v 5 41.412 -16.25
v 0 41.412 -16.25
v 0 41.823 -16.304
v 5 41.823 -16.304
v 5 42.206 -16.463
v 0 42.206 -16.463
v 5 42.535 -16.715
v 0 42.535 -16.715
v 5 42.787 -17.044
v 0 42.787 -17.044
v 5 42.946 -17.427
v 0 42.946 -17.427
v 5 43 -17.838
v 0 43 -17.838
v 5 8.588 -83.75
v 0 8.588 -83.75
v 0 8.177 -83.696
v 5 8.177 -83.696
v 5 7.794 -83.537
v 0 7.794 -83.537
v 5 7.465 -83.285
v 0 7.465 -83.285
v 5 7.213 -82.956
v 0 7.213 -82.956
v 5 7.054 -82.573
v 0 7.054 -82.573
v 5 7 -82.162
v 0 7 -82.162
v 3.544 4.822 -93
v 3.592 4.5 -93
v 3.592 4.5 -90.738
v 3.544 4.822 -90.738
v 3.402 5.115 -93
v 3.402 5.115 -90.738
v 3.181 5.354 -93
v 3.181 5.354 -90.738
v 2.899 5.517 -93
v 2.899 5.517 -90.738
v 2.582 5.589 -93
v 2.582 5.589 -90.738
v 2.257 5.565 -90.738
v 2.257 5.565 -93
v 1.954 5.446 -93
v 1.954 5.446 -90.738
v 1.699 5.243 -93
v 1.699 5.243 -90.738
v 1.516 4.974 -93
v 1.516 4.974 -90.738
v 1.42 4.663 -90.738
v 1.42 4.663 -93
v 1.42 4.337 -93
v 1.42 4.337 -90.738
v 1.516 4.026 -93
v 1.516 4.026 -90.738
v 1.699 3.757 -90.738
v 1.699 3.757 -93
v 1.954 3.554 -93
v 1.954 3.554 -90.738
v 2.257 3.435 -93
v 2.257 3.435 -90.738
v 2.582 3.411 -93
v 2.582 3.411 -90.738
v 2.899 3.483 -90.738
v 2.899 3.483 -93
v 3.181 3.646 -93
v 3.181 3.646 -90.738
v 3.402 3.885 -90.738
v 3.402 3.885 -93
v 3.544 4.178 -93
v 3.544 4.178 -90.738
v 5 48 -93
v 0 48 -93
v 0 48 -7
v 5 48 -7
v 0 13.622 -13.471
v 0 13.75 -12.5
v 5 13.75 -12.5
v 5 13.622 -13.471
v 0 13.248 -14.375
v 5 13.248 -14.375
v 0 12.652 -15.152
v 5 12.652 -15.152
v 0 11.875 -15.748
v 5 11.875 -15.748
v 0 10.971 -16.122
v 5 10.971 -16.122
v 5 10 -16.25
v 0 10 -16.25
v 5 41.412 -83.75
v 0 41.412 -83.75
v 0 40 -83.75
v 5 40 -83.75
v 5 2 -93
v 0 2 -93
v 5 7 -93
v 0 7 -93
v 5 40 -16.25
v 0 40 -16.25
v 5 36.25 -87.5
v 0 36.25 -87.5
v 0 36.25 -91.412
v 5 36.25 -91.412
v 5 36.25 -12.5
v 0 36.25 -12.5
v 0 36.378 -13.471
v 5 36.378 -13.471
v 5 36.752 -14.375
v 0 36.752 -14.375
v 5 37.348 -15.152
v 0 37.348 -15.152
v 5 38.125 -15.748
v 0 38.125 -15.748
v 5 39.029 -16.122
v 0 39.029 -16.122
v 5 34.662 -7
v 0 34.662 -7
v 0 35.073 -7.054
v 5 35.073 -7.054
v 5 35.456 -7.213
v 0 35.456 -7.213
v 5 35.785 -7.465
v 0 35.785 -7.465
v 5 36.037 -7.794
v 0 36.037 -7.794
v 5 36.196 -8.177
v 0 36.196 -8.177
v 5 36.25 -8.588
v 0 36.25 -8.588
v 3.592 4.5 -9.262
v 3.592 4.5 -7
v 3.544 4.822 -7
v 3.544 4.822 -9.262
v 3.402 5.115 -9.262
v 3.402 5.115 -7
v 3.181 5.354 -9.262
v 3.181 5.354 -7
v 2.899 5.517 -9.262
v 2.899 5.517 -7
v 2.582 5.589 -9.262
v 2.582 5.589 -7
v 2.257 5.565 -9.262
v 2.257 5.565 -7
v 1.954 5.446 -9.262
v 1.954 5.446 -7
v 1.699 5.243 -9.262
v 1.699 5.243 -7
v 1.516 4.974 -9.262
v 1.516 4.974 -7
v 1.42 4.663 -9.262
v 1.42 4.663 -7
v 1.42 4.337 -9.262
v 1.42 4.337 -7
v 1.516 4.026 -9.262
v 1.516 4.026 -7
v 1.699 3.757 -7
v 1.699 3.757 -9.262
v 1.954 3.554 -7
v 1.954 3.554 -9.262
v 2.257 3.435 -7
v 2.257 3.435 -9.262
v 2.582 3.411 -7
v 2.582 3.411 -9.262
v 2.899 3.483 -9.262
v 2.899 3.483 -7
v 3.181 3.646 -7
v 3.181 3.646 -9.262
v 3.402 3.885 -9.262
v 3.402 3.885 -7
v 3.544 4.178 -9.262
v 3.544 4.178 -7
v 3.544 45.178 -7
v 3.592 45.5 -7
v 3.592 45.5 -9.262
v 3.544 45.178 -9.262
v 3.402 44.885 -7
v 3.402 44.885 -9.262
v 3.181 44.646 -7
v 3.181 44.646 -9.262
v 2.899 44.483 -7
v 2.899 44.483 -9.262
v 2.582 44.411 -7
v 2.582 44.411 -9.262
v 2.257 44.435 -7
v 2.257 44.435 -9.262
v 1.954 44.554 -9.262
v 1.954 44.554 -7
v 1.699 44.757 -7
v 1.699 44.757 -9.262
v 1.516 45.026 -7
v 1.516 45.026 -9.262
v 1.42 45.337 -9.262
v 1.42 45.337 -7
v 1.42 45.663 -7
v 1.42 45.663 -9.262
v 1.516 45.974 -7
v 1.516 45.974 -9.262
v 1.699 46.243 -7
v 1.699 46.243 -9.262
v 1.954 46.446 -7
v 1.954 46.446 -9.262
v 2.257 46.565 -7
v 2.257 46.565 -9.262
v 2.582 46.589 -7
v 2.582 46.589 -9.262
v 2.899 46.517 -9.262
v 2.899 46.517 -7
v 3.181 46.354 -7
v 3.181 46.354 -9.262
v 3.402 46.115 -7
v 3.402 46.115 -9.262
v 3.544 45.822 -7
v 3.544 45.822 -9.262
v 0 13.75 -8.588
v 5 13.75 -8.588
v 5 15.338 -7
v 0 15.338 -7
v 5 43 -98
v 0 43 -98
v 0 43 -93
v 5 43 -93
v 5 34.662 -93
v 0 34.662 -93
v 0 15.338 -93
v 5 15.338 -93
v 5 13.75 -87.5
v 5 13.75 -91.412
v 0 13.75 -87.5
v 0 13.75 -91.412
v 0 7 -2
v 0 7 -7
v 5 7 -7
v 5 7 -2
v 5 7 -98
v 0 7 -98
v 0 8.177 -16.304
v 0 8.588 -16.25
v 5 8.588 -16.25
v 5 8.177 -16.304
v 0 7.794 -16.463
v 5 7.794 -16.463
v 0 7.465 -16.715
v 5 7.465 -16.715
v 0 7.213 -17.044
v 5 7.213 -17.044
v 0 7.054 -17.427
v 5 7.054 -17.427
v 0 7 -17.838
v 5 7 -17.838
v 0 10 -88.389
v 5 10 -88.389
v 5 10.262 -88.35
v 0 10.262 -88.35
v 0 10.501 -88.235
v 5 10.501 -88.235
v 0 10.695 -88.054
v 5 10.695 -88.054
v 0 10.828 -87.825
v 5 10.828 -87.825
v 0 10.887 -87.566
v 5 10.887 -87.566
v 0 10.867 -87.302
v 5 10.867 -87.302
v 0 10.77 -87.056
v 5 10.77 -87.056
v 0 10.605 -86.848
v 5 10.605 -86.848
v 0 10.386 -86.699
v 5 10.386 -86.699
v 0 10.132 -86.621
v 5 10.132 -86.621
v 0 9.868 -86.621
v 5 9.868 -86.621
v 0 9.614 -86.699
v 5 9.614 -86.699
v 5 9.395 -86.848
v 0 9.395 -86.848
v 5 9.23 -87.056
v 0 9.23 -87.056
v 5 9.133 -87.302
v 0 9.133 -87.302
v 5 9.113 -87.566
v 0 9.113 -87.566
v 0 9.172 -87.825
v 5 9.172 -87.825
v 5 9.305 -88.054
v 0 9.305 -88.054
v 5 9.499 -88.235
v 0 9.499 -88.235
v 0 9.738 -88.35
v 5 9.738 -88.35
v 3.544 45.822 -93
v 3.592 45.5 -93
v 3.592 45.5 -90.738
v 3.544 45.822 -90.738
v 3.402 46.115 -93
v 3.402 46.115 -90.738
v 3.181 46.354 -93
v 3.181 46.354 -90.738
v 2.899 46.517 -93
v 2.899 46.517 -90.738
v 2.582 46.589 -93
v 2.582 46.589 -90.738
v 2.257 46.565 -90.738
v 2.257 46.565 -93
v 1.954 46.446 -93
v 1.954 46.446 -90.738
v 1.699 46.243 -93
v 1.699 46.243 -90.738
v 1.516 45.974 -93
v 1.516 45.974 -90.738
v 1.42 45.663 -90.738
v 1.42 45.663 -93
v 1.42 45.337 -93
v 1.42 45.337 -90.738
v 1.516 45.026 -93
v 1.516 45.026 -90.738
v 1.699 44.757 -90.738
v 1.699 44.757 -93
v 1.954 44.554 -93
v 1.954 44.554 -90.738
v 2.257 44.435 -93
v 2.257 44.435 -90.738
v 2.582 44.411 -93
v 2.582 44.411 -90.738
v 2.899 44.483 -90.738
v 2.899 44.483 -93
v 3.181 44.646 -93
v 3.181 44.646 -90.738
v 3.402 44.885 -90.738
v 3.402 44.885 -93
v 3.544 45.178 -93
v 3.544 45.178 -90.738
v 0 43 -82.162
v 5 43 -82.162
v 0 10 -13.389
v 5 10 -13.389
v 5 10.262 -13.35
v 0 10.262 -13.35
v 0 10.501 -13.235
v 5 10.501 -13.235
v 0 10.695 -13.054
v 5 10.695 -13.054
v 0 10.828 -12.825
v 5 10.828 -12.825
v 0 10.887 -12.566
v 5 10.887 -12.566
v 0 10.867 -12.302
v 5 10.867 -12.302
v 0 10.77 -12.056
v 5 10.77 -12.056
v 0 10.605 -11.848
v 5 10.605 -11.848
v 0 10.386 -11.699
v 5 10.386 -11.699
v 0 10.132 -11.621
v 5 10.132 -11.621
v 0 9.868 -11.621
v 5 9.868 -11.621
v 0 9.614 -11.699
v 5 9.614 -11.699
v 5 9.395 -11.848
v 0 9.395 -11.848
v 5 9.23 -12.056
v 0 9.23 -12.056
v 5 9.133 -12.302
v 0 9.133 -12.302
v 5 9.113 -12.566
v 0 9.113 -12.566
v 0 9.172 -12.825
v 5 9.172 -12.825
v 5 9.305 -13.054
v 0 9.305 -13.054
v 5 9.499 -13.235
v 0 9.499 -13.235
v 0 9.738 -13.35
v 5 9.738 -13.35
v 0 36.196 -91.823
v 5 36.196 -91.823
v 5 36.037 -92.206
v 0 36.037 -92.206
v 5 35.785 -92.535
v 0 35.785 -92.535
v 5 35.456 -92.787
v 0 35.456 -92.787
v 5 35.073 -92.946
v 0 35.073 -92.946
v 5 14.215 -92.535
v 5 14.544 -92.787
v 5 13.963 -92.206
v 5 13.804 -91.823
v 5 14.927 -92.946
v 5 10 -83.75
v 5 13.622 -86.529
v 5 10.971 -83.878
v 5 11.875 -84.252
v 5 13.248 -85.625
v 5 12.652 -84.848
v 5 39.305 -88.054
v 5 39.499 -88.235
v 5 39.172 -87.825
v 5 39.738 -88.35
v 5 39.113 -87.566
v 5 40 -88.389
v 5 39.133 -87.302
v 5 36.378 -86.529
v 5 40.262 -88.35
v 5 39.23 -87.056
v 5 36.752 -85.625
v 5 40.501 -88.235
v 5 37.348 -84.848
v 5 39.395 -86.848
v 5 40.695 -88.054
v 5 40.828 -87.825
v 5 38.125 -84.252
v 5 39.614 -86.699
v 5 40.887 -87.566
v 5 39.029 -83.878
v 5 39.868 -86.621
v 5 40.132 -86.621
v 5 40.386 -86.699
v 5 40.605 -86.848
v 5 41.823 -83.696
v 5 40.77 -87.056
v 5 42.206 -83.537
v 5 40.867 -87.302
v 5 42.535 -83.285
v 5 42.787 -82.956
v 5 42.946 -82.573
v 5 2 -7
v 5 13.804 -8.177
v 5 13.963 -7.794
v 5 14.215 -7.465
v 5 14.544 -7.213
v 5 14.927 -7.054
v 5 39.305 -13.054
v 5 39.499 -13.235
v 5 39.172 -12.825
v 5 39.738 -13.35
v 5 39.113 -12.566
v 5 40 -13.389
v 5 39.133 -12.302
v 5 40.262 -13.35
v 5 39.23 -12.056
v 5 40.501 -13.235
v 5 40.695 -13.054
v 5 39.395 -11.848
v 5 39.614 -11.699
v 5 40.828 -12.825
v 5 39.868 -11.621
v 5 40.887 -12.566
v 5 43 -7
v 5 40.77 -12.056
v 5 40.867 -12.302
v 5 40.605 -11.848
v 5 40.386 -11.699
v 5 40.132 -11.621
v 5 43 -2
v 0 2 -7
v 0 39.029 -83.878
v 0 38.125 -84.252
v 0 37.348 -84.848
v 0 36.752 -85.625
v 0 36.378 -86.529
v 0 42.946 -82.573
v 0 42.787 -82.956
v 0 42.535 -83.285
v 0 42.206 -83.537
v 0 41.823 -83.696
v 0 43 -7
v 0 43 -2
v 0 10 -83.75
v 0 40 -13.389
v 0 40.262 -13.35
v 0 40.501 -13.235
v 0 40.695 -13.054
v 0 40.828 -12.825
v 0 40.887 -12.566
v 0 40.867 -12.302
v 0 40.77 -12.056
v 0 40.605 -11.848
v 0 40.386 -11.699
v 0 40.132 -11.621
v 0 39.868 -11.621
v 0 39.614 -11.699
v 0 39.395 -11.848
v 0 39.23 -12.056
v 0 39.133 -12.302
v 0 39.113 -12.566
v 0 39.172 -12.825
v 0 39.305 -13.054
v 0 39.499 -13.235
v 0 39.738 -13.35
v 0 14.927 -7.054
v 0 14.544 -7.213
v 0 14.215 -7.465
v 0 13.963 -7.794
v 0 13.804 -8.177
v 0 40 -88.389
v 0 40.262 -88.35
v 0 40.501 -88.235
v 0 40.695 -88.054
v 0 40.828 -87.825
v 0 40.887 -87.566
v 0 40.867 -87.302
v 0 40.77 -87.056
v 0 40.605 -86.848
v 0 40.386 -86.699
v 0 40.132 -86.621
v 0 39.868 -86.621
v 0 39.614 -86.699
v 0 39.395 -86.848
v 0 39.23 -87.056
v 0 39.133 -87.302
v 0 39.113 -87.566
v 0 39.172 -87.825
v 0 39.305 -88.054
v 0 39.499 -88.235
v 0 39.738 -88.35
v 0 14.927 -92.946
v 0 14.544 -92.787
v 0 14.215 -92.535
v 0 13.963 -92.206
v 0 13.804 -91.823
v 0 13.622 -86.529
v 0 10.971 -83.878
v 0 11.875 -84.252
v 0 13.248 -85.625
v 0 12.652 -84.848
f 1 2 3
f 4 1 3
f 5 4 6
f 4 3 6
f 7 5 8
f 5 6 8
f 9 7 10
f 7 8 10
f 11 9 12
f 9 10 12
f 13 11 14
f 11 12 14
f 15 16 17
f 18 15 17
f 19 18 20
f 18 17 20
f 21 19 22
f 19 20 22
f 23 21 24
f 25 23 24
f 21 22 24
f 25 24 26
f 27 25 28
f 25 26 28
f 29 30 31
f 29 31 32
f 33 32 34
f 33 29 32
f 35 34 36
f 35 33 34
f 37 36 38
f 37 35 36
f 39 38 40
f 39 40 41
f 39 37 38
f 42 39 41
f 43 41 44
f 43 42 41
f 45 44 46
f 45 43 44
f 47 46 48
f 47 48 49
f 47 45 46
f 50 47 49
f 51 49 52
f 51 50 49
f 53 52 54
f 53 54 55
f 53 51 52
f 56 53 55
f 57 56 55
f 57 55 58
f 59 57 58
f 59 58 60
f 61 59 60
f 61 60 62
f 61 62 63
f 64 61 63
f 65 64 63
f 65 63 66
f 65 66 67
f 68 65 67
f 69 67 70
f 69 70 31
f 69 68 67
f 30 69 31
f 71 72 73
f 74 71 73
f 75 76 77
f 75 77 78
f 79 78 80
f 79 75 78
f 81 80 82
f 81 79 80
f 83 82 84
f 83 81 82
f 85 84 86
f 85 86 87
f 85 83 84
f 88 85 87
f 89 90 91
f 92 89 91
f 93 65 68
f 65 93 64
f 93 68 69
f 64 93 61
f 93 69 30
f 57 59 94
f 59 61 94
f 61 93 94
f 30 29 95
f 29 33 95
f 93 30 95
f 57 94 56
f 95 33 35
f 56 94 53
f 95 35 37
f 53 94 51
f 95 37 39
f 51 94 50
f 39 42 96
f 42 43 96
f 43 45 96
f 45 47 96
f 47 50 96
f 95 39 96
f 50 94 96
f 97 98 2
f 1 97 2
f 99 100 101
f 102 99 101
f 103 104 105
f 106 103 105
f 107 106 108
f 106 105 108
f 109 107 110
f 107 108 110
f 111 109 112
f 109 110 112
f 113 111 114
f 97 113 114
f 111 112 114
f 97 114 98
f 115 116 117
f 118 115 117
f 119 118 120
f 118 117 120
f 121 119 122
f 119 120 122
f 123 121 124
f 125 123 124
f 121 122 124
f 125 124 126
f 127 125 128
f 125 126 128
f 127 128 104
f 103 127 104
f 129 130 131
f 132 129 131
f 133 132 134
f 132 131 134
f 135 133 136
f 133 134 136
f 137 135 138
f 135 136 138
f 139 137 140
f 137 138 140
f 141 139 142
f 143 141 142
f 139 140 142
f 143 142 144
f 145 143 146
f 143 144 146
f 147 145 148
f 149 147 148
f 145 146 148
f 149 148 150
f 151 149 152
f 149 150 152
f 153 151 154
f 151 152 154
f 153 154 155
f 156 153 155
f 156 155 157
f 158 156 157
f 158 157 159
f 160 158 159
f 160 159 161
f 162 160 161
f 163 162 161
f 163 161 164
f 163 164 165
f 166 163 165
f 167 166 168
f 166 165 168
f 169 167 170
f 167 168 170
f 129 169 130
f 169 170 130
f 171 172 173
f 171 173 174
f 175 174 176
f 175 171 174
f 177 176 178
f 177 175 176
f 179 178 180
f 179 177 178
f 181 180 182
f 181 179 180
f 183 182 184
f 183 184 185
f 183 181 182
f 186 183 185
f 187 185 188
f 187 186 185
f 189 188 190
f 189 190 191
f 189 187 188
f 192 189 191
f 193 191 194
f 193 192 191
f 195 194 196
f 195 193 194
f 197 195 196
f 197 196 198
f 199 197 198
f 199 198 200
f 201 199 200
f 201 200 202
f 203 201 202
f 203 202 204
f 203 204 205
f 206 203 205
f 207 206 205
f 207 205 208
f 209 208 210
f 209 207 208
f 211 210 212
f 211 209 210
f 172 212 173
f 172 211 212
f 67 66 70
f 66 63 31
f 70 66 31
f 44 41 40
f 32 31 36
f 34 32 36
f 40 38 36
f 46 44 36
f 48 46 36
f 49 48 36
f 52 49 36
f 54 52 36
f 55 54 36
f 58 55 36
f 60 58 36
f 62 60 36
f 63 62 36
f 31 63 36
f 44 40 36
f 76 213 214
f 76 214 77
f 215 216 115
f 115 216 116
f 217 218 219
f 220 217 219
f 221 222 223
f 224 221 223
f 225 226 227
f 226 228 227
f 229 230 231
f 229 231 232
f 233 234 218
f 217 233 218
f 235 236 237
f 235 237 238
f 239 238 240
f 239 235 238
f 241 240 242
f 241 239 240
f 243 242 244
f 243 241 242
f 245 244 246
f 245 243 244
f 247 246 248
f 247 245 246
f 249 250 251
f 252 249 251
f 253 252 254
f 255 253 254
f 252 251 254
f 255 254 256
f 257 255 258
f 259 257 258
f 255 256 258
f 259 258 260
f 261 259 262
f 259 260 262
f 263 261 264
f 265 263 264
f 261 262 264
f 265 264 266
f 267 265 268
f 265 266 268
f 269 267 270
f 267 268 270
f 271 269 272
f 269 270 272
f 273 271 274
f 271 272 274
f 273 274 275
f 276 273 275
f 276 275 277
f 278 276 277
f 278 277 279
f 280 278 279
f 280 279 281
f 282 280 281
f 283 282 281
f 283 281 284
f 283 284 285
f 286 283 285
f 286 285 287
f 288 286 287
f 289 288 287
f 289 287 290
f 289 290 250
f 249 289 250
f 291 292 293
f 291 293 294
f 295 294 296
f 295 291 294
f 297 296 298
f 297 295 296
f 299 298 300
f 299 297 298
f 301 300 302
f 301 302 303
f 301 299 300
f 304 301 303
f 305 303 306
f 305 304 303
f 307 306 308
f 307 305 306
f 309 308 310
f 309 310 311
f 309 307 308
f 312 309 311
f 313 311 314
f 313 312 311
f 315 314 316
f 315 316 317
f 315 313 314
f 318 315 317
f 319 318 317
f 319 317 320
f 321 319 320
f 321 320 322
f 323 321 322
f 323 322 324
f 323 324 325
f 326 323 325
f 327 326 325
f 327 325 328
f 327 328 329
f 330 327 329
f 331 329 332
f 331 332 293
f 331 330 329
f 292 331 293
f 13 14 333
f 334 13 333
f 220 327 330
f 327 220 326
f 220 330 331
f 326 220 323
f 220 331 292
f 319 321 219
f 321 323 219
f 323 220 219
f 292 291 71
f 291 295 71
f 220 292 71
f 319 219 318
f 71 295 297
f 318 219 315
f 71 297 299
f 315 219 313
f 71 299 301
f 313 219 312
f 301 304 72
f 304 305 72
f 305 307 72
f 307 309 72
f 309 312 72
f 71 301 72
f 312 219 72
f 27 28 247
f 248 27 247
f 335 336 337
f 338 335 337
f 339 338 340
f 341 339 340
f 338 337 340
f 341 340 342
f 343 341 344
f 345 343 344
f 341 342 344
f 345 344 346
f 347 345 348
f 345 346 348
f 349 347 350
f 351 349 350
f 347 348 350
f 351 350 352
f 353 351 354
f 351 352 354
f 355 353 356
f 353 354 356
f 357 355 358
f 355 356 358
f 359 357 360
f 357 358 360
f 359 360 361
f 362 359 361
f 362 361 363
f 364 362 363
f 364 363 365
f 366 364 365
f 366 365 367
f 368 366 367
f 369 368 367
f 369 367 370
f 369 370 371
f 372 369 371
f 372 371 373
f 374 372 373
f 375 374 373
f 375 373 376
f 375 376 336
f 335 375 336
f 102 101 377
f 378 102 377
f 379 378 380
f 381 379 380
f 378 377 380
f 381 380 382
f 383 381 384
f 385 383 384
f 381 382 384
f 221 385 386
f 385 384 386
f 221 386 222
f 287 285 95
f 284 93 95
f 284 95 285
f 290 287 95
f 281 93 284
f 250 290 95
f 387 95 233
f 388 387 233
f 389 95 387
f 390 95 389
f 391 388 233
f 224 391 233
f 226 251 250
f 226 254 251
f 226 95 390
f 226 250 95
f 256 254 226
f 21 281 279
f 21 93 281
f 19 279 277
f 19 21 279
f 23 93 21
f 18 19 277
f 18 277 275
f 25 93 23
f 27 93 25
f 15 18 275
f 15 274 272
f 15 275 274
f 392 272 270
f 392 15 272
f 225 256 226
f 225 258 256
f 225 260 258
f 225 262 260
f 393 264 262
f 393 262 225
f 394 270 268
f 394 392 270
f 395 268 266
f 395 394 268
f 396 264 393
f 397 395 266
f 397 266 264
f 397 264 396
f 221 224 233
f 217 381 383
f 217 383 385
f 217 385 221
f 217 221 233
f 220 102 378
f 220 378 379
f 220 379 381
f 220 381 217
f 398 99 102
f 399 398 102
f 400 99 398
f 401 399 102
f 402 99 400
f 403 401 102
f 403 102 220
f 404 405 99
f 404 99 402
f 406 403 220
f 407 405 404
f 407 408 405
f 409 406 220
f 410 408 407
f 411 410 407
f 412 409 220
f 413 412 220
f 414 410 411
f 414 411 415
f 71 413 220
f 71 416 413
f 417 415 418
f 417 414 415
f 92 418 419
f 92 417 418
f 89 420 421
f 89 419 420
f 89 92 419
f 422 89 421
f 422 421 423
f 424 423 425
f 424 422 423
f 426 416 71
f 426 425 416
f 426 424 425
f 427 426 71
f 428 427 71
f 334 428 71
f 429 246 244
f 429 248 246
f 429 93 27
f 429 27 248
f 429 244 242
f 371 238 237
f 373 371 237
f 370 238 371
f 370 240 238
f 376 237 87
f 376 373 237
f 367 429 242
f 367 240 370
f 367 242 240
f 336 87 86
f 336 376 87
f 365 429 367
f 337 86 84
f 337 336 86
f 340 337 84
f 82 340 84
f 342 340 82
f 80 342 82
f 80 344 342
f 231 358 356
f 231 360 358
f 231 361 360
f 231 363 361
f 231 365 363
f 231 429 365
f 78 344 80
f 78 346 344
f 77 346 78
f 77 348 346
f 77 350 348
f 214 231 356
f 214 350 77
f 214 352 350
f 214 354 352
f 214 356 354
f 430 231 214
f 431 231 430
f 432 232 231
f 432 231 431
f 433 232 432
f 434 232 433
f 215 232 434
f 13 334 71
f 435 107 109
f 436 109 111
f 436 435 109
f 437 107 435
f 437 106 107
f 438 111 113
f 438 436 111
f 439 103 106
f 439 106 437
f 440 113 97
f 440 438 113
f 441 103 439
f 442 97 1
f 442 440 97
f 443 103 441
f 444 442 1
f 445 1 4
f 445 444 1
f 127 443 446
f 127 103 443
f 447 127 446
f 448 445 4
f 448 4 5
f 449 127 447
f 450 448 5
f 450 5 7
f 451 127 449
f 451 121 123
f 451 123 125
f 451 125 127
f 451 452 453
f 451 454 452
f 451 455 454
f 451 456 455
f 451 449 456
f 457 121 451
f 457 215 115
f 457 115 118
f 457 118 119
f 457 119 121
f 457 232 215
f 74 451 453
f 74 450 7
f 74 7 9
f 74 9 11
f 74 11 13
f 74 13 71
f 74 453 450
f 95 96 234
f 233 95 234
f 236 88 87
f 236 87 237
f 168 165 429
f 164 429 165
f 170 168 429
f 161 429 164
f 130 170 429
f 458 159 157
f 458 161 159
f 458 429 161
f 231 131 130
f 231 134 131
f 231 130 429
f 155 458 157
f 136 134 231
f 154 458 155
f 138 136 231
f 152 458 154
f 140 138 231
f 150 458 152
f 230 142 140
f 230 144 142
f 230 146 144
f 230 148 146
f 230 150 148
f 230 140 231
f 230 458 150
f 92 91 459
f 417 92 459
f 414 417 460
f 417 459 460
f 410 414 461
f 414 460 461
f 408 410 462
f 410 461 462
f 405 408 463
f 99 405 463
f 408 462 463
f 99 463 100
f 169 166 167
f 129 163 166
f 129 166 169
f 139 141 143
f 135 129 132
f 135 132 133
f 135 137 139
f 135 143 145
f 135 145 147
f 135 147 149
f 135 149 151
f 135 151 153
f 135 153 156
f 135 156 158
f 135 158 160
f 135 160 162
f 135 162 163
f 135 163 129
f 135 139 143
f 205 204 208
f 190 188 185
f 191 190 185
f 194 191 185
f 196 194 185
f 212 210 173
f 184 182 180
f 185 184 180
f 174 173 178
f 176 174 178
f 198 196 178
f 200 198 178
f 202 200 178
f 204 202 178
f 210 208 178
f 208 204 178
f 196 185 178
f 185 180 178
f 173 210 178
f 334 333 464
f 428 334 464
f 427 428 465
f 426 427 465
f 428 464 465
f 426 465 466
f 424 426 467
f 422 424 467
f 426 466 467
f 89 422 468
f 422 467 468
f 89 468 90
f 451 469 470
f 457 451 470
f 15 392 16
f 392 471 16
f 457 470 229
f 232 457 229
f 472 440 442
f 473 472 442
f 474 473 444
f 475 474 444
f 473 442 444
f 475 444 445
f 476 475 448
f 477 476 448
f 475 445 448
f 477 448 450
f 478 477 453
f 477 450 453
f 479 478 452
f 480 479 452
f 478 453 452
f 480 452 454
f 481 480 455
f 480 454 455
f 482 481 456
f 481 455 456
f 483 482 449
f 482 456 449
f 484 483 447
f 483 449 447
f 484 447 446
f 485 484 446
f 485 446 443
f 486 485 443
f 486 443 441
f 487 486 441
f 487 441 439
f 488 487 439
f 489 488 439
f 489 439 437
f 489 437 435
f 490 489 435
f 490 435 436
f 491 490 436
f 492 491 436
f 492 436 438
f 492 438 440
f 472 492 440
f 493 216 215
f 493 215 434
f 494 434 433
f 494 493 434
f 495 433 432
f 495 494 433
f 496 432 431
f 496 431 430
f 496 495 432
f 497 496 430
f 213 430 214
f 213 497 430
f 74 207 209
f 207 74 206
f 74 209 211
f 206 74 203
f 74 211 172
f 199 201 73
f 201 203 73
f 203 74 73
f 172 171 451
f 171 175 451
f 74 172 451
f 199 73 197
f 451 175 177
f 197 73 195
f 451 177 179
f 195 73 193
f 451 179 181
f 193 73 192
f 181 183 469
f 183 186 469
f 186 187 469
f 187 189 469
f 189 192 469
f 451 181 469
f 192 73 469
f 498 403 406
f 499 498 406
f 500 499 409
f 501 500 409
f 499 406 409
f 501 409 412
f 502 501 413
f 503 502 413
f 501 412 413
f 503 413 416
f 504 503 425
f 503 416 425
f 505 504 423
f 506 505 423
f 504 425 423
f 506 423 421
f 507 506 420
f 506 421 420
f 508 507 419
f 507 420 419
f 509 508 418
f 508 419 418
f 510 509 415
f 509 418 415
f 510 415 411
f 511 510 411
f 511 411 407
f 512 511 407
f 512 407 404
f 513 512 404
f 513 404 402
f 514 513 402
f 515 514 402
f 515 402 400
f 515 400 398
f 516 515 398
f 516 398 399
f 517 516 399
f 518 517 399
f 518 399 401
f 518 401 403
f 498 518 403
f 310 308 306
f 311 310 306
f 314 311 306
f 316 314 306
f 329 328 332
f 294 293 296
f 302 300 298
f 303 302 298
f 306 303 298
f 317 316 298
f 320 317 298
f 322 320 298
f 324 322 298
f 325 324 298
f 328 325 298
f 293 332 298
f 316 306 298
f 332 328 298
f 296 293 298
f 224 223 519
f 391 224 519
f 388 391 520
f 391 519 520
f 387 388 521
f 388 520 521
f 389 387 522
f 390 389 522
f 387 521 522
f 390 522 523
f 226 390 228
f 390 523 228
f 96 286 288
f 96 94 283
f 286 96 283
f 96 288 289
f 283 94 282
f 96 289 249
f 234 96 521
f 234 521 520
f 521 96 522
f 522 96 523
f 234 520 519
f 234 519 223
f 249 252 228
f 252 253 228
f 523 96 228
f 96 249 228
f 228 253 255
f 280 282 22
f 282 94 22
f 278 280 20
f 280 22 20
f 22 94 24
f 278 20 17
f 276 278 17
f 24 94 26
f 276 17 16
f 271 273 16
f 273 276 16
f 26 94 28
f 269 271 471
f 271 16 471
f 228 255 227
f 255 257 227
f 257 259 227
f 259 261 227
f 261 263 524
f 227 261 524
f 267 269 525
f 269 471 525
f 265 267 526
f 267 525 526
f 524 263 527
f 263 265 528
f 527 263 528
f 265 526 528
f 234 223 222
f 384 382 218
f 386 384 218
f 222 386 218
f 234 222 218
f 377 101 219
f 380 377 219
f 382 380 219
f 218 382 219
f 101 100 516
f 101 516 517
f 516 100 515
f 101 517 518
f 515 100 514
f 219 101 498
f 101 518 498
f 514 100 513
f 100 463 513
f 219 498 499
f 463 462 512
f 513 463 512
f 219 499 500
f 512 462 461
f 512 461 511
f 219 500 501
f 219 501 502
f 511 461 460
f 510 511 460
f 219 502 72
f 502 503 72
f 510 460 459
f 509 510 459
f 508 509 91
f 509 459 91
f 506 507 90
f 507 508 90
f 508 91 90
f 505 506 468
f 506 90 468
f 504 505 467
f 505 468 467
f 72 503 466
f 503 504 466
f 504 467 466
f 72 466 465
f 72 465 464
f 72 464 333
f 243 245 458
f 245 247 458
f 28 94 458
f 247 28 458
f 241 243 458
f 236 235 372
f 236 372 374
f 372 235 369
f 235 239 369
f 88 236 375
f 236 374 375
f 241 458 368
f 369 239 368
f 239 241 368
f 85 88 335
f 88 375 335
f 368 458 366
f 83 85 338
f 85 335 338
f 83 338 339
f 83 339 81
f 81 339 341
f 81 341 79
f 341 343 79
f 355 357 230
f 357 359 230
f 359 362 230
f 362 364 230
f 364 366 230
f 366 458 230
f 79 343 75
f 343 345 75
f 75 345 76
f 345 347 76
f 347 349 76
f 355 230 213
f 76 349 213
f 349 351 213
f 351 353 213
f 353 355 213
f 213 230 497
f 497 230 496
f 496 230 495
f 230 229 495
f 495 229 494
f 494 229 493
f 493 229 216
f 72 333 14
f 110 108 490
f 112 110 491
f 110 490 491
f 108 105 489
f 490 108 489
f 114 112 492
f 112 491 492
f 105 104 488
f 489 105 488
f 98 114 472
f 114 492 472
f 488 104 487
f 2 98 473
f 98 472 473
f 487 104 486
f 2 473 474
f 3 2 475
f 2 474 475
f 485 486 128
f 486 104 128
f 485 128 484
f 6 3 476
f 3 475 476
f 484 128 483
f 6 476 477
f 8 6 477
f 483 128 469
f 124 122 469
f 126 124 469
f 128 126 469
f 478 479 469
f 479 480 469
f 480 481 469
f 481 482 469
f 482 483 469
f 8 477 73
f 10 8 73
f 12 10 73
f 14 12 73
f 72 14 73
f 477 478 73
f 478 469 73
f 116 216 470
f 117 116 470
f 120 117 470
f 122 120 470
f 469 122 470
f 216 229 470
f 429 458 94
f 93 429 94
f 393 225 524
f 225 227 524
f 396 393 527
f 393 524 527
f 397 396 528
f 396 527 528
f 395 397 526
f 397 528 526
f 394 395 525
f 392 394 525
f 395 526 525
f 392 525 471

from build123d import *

# Parameters (mm, degrees)
BOSS_EXTRUDE2_DEPTH       = 5
SKETCH3_R                 = 1.0922
CUT_EXTRUDE2_DEPTH        = 2.2625
MIRROR27_START            = 3.5922
MIRROR27_DEPTH            = 1.4078
MIRROR27_2_DEPTH          = 1.4077999
MIRROR27_START_2          = 1.4077999
MIRROR27_3_DEPTH          = 2.1844001
MIRROR27_START_3          = -93
MIRROR27_4_OUTLINE_R      = 1.0922
MIRROR27_4_DEPTH          = 2.2625
TAP_DRILL_FOR_2_56_TAP1_D = 1.778


with BuildPart() as part:
    # Sketch1 → Boss-Extrude2 (new body)
    with BuildSketch(Plane(origin=(0, 0, 0), x_dir=(0, 0, -1), z_dir=(1, 0, 0))):
        with BuildLine():
            Line((2, 25), (7, 25))
            Line((7, 25), (7, 15.3375))
            ThreePointArc((7, 15.3375), (7.464967985, 14.214967985), (8.5875, 13.75))
            Line((8.5875, 13.75), (12.5, 13.75))
            ThreePointArc((12.5, 13.75), (15.151650429, 12.651650429), (16.25, 10))
            Line((16.25, 10), (16.25, 8.5875))
            ThreePointArc((16.25, 8.5875), (16.714967985, 7.464967985), (17.8375, 7))
            Line((17.8375, 7), (50, 7))
            Line((50, 7), (50, 2))
            Line((50, 2), (7, 2))
            Line((7, 2), (7, 7))
            Line((7, 7), (2, 7))
            Line((2, 7), (2, 25))
        make_face()
    boss_extrude2 = extrude(amount=BOSS_EXTRUDE2_DEPTH)

    # Sketch3 → Cut-Extrude2 (cut)
    with BuildSketch(Plane.XY.offset(-7)):
        with Locations((2.5, 4.5)):
            Circle(SKETCH3_R)
    cut_extrude2 = extrude(amount=-CUT_EXTRUDE2_DEPTH, mode=Mode.SUBTRACT)

    # Mirror26: Boss-Extrude2, Cut-Extrude2 across plane
    add(boss_extrude2.mirror(Plane.ZX.offset(25)))
    add(cut_extrude2.mirror(Plane.ZX.offset(25)), mode=Mode.SUBTRACT)

    # Mirror27: read off the stored shape, not the designer's step
    # Mirror27 outline → Mirror27 (add)
    with BuildSketch(Plane.YZ.offset(MIRROR27_START)):
        with BuildLine():
            ThreePointArc((15.3375, -93), (14.214967985, -92.535032015), (13.75, -91.4125))
            Line((13.75, -91.4125), (13.75, -87.5))
            ThreePointArc((13.75, -87.5), (12.651650429, -84.848349571), (10, -83.75))
            Line((10, -83.75), (8.5875, -83.75))
            ThreePointArc((8.5875, -83.75), (7.464967985, -83.285032015), (7, -82.1625))
            Line((7, -82.1625), (7, -50))
            Line((7, -50), (2, -50))
            Line((2, -50), (2, -93))
            Line((2, -93), (7, -93))
            Line((7, -93), (7, -98))
            Line((7, -98), (43, -98))
            Line((43, -98), (43, -93))
            Line((43, -93), (48, -93))
            Line((48, -93), (48, -50))
            Line((48, -50), (43, -50))
            Line((43, -50), (43, -82.1625))
            ThreePointArc((43, -82.1625), (42.535032015, -83.285032015), (41.4125, -83.75))
            Line((41.4125, -83.75), (40, -83.75))
            ThreePointArc((40, -83.75), (37.348349571, -84.848349571), (36.25, -87.5))
            Line((36.25, -87.5), (36.25, -91.4125))
            ThreePointArc((36.25, -91.4125), (35.785032015, -92.535032015), (34.6625, -93))
            Line((34.6625, -93), (15.3375, -93))
        make_face()
    extrude(amount=MIRROR27_DEPTH)

    # Mirror27 2 outline → Mirror27 2 (add)
    with BuildSketch(Plane.YZ):
        with BuildLine():
            ThreePointArc((15.3375, -93), (14.214967985, -92.535032015), (13.75, -91.4125))
            Line((13.75, -91.4125), (13.75, -87.5))
            ThreePointArc((13.75, -87.5), (12.651650429, -84.848349571), (10, -83.75))
            Line((10, -83.75), (8.5875, -83.75))
            ThreePointArc((8.5875, -83.75), (7.464967985, -83.285032015), (7, -82.1625))
            Line((7, -82.1625), (7, -50))
            Line((7, -50), (2, -50))
            Line((2, -50), (2, -93))
            Line((2, -93), (7, -93))
            Line((7, -93), (7, -98))
            Line((7, -98), (43, -98))
            Line((43, -98), (43, -93))
            Line((43, -93), (48, -93))
            Line((48, -93), (48, -50))
            Line((48, -50), (43, -50))
            Line((43, -50), (43, -82.1625))
            ThreePointArc((43, -82.1625), (42.535032015, -83.285032015), (41.4125, -83.75))
            Line((41.4125, -83.75), (40, -83.75))
            ThreePointArc((40, -83.75), (37.348349571, -84.848349571), (36.25, -87.5))
            Line((36.25, -87.5), (36.25, -91.4125))
            ThreePointArc((36.25, -91.4125), (35.785032015, -92.535032015), (34.6625, -93))
            Line((34.6625, -93), (15.3375, -93))
        make_face()
    extrude(amount=MIRROR27_2_DEPTH)

    # Mirror27 3 outline → Mirror27 3 (add)
    with BuildSketch(Plane.YZ.offset(MIRROR27_START_2)):
        with BuildLine():
            ThreePointArc((15.3375, -93), (14.214967985, -92.535032015), (13.75, -91.4125))
            Line((13.75, -91.4125), (13.75, -87.5))
            ThreePointArc((13.75, -87.5), (12.651650429, -84.848349571), (10, -83.75))
            Line((10, -83.75), (8.5875, -83.75))
            ThreePointArc((8.5875, -83.75), (7.464967985, -83.285032015), (7, -82.1625))
            Line((7, -82.1625), (7, -50))
            Line((7, -50), (2, -50))
            Line((2, -50), (2, -93))
            Line((2, -93), (7, -93))
            Line((7, -93), (7, -98))
            Line((7, -98), (43, -98))
            Line((43, -98), (43, -93))
            Line((43, -93), (48, -93))
            Line((48, -93), (48, -50))
            Line((48, -50), (43, -50))
            Line((43, -50), (43, -82.1625))
            ThreePointArc((43, -82.1625), (42.535032015, -83.285032015), (41.4125, -83.75))
            Line((41.4125, -83.75), (40, -83.75))
            ThreePointArc((40, -83.75), (37.348349571, -84.848349571), (36.25, -87.5))
            Line((36.25, -87.5), (36.25, -91.4125))
            ThreePointArc((36.25, -91.4125), (35.785032015, -92.535032015), (34.6625, -93))
            Line((34.6625, -93), (15.3375, -93))
        make_face()
    extrude(amount=MIRROR27_3_DEPTH)

    # Mirror27 4 outline → Mirror27 4 (cut)
    with BuildSketch(Plane.XY.offset(MIRROR27_START_3)):
        with Locations((2.5, 4.5)):
            Circle(MIRROR27_4_OUTLINE_R)
        with Locations((2.5, 45.5)):
            Circle(MIRROR27_4_OUTLINE_R)
    extrude(amount=MIRROR27_4_DEPTH, mode=Mode.SUBTRACT)

    # Tap Drill for #2-56 Tap1 (through all)
    with Locations(Plane.ZY):
        with Locations((-87.5, 10), (-87.5, 40), (-12.5, 40), (-12.5, 10)):
            Hole(TAP_DRILL_FOR_2_56_TAP1_D / 2)


solid = part.part
